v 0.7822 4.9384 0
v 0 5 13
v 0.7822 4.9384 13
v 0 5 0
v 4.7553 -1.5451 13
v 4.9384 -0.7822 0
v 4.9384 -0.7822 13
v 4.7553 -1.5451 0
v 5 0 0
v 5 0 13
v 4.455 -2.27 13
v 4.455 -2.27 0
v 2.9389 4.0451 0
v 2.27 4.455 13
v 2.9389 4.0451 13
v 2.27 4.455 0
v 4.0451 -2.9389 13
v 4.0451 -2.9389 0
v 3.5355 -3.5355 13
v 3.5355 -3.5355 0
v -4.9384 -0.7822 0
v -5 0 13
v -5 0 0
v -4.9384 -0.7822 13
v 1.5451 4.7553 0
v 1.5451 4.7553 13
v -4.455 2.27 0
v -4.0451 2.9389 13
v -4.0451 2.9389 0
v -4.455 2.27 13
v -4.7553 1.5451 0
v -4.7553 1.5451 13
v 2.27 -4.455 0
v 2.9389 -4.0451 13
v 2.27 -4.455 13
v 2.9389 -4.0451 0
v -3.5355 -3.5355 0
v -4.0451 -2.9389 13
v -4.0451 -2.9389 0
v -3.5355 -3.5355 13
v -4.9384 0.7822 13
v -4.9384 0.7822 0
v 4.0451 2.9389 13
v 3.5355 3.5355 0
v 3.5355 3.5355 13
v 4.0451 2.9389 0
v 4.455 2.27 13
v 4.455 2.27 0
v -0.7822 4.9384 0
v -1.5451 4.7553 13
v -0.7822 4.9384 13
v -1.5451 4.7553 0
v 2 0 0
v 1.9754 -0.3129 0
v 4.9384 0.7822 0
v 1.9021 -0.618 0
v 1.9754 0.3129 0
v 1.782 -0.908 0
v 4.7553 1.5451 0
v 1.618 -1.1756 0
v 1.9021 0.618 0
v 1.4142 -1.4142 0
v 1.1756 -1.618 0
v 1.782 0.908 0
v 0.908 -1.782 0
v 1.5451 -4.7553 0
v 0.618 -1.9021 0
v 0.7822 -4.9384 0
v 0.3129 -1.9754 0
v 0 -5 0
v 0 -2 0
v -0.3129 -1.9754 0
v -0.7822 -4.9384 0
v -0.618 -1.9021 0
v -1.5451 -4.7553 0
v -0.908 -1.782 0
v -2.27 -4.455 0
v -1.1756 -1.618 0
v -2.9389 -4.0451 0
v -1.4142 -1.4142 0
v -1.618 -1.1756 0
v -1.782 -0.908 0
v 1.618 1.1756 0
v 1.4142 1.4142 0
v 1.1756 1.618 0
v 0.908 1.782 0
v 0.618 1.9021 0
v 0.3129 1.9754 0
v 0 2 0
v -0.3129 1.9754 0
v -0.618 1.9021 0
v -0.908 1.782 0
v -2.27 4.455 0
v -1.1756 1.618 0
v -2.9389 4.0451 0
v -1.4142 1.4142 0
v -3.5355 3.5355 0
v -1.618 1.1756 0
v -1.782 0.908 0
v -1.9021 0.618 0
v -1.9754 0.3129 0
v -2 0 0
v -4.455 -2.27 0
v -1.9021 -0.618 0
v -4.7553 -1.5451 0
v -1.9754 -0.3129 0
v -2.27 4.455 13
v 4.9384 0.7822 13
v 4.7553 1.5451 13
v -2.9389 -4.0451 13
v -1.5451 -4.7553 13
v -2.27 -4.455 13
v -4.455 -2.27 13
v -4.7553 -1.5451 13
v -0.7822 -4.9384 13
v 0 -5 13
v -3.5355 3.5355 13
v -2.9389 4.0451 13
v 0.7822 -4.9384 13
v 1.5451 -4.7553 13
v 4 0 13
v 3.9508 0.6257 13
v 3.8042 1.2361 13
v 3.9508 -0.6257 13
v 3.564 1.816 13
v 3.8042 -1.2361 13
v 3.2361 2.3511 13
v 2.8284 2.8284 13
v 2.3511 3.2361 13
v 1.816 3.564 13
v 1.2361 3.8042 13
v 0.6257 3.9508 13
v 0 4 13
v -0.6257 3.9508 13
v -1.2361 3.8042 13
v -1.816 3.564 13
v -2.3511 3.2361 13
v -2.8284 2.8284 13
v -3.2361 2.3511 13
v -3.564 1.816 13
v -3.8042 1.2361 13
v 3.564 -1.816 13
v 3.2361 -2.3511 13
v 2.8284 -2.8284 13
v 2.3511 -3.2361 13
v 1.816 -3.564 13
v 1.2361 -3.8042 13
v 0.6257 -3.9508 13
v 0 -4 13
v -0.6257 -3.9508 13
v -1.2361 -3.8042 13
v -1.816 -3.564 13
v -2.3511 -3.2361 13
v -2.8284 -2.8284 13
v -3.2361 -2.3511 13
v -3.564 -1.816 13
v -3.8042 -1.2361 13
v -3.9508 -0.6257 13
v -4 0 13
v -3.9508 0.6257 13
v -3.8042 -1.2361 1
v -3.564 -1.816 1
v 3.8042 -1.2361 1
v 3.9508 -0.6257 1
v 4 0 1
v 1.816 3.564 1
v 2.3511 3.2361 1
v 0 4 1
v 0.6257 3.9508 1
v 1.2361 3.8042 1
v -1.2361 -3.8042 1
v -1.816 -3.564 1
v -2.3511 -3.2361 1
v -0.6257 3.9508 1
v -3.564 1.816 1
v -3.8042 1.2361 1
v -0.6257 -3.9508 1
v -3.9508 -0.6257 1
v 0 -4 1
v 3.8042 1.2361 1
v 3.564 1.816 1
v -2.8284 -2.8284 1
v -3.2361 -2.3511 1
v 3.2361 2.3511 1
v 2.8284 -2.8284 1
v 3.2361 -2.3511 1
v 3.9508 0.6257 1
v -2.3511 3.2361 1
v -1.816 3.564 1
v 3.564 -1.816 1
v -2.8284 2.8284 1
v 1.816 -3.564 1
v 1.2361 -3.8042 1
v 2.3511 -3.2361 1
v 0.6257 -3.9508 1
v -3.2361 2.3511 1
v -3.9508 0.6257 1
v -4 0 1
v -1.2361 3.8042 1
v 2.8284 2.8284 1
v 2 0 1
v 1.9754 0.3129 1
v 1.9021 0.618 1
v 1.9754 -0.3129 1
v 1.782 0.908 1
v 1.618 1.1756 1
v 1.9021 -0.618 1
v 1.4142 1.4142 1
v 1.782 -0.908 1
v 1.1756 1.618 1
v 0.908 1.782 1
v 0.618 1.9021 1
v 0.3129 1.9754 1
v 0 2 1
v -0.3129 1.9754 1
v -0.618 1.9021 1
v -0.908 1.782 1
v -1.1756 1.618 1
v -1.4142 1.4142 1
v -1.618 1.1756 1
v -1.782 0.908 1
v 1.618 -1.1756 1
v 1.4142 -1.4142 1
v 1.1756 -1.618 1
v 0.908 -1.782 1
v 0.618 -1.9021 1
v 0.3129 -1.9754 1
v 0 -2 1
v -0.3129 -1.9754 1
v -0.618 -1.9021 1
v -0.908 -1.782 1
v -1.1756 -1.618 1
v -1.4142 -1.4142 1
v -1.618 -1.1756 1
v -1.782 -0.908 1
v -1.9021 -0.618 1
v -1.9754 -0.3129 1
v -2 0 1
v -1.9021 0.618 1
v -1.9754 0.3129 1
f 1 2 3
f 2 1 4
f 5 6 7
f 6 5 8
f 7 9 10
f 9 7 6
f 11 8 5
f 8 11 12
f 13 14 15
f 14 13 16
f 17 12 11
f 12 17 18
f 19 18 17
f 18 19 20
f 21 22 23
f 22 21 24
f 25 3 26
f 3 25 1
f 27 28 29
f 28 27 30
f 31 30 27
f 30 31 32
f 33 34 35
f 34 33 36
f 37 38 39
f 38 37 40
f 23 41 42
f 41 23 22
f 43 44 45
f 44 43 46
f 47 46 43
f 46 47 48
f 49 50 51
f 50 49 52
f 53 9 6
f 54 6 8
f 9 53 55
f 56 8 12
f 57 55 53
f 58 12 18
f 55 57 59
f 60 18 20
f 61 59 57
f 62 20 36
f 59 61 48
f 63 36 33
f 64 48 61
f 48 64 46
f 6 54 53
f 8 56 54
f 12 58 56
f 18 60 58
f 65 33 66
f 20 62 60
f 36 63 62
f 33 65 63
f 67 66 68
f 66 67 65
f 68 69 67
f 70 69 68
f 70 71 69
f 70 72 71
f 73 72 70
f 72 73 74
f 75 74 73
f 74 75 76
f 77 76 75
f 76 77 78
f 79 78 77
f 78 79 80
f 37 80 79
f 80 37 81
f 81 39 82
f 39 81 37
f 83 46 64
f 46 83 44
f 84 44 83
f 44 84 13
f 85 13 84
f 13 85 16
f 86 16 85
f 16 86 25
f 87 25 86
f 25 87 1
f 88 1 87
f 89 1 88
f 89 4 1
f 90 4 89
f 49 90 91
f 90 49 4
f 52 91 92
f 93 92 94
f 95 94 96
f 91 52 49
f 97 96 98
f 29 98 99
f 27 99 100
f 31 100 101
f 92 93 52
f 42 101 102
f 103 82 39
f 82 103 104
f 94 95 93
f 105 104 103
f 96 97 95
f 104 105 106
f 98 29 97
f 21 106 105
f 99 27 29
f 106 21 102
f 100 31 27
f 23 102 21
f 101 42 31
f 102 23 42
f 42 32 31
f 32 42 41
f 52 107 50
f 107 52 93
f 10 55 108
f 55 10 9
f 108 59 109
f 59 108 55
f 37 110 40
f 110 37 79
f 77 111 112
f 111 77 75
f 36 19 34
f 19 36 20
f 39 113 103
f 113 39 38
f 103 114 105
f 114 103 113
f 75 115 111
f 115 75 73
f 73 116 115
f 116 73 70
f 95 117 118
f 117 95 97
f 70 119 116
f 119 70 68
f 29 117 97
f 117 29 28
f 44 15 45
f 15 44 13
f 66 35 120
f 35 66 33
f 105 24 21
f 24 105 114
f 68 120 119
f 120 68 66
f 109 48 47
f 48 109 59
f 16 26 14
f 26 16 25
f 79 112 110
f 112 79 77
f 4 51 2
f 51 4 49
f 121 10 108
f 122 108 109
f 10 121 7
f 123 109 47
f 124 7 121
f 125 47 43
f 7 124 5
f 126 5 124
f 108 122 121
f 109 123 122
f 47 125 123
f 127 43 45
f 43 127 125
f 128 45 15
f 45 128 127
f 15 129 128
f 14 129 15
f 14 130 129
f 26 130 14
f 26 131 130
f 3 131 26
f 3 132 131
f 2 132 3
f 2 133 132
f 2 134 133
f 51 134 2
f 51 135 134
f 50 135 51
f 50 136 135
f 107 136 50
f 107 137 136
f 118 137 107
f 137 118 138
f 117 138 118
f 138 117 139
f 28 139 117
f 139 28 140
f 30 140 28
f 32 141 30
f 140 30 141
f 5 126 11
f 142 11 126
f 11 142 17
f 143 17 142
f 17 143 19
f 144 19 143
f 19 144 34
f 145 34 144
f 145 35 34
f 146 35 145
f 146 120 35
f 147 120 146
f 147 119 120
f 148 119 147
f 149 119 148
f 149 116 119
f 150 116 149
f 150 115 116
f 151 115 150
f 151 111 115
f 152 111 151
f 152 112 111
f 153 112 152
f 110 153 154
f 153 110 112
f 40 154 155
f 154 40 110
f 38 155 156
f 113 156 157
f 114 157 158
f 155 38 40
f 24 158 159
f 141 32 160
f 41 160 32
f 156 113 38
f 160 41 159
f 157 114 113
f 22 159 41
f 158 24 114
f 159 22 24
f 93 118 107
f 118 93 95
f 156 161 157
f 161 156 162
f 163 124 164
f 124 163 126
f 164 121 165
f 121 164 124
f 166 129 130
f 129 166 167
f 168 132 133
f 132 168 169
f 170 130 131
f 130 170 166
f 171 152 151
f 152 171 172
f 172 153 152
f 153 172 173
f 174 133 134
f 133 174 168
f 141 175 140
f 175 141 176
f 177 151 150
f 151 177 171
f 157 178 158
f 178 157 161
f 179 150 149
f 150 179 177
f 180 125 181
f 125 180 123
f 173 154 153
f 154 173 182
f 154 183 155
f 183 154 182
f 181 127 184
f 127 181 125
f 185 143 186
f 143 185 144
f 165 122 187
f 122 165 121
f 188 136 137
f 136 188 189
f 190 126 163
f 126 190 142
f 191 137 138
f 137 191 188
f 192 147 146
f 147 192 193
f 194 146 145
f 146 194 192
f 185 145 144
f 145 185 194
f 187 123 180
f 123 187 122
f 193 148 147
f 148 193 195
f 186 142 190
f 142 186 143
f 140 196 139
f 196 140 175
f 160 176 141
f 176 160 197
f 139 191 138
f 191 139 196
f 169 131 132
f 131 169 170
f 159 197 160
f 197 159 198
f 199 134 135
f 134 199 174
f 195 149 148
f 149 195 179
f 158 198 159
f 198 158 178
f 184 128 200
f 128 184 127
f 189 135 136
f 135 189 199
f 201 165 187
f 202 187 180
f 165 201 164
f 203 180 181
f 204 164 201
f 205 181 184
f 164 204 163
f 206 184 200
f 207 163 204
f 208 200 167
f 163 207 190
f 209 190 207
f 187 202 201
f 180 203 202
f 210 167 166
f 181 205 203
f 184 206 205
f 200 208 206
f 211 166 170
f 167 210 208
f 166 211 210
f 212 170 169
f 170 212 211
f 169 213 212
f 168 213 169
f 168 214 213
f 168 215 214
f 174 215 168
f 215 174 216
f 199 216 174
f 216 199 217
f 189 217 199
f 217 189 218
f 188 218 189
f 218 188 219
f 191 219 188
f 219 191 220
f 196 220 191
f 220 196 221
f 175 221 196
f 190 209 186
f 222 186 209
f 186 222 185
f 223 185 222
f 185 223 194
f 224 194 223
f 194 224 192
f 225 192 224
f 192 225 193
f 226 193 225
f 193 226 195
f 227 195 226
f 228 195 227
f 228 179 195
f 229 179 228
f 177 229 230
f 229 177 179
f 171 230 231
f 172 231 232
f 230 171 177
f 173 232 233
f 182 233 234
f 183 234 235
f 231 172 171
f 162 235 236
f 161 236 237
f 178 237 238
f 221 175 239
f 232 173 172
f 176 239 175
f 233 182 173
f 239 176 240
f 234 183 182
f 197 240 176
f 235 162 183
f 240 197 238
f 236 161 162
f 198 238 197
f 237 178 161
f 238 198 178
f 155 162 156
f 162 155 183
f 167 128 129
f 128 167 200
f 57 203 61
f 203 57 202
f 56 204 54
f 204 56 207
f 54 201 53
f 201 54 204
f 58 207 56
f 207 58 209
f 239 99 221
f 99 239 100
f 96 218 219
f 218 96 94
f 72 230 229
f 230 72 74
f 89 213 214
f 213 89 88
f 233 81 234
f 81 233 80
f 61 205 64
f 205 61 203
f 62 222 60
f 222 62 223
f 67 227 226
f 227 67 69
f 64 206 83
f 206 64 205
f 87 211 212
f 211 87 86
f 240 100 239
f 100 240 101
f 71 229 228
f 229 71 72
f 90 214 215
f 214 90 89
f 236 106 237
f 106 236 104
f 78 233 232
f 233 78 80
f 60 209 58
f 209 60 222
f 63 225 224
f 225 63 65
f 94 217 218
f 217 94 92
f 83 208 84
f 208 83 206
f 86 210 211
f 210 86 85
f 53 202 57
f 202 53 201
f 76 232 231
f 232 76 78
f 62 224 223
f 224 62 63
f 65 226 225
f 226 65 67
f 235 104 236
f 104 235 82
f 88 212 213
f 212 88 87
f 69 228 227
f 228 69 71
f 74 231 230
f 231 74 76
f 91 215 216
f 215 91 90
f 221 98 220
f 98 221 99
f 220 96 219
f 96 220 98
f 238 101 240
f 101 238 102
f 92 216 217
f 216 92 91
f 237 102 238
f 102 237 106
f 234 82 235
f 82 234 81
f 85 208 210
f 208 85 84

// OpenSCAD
led_diameter = 6;
interior_clearance = 1;
wall_thickness = 1;
resolution = 40;
shade_height = 12;
top_hole = 2;

base_radius = interior_clearance + led_diameter/2;

module shade(){
difference(){
    cylinder(h = shade_height+wall_thickness, r = base_radius+wall_thickness, $fn = resolution);
    cylinder(h = shade_height, r = base_radius, $fn = resolution);
	translate([0, 0, 10]){
	    cylinder(h = shade_height, r = top_hole, $fn = resolution);
	}
    }
}

rotate([180, 0, 0]){
    translate([0, 0, -shade_height-wall_thickness]){
	shade();
    }
}
